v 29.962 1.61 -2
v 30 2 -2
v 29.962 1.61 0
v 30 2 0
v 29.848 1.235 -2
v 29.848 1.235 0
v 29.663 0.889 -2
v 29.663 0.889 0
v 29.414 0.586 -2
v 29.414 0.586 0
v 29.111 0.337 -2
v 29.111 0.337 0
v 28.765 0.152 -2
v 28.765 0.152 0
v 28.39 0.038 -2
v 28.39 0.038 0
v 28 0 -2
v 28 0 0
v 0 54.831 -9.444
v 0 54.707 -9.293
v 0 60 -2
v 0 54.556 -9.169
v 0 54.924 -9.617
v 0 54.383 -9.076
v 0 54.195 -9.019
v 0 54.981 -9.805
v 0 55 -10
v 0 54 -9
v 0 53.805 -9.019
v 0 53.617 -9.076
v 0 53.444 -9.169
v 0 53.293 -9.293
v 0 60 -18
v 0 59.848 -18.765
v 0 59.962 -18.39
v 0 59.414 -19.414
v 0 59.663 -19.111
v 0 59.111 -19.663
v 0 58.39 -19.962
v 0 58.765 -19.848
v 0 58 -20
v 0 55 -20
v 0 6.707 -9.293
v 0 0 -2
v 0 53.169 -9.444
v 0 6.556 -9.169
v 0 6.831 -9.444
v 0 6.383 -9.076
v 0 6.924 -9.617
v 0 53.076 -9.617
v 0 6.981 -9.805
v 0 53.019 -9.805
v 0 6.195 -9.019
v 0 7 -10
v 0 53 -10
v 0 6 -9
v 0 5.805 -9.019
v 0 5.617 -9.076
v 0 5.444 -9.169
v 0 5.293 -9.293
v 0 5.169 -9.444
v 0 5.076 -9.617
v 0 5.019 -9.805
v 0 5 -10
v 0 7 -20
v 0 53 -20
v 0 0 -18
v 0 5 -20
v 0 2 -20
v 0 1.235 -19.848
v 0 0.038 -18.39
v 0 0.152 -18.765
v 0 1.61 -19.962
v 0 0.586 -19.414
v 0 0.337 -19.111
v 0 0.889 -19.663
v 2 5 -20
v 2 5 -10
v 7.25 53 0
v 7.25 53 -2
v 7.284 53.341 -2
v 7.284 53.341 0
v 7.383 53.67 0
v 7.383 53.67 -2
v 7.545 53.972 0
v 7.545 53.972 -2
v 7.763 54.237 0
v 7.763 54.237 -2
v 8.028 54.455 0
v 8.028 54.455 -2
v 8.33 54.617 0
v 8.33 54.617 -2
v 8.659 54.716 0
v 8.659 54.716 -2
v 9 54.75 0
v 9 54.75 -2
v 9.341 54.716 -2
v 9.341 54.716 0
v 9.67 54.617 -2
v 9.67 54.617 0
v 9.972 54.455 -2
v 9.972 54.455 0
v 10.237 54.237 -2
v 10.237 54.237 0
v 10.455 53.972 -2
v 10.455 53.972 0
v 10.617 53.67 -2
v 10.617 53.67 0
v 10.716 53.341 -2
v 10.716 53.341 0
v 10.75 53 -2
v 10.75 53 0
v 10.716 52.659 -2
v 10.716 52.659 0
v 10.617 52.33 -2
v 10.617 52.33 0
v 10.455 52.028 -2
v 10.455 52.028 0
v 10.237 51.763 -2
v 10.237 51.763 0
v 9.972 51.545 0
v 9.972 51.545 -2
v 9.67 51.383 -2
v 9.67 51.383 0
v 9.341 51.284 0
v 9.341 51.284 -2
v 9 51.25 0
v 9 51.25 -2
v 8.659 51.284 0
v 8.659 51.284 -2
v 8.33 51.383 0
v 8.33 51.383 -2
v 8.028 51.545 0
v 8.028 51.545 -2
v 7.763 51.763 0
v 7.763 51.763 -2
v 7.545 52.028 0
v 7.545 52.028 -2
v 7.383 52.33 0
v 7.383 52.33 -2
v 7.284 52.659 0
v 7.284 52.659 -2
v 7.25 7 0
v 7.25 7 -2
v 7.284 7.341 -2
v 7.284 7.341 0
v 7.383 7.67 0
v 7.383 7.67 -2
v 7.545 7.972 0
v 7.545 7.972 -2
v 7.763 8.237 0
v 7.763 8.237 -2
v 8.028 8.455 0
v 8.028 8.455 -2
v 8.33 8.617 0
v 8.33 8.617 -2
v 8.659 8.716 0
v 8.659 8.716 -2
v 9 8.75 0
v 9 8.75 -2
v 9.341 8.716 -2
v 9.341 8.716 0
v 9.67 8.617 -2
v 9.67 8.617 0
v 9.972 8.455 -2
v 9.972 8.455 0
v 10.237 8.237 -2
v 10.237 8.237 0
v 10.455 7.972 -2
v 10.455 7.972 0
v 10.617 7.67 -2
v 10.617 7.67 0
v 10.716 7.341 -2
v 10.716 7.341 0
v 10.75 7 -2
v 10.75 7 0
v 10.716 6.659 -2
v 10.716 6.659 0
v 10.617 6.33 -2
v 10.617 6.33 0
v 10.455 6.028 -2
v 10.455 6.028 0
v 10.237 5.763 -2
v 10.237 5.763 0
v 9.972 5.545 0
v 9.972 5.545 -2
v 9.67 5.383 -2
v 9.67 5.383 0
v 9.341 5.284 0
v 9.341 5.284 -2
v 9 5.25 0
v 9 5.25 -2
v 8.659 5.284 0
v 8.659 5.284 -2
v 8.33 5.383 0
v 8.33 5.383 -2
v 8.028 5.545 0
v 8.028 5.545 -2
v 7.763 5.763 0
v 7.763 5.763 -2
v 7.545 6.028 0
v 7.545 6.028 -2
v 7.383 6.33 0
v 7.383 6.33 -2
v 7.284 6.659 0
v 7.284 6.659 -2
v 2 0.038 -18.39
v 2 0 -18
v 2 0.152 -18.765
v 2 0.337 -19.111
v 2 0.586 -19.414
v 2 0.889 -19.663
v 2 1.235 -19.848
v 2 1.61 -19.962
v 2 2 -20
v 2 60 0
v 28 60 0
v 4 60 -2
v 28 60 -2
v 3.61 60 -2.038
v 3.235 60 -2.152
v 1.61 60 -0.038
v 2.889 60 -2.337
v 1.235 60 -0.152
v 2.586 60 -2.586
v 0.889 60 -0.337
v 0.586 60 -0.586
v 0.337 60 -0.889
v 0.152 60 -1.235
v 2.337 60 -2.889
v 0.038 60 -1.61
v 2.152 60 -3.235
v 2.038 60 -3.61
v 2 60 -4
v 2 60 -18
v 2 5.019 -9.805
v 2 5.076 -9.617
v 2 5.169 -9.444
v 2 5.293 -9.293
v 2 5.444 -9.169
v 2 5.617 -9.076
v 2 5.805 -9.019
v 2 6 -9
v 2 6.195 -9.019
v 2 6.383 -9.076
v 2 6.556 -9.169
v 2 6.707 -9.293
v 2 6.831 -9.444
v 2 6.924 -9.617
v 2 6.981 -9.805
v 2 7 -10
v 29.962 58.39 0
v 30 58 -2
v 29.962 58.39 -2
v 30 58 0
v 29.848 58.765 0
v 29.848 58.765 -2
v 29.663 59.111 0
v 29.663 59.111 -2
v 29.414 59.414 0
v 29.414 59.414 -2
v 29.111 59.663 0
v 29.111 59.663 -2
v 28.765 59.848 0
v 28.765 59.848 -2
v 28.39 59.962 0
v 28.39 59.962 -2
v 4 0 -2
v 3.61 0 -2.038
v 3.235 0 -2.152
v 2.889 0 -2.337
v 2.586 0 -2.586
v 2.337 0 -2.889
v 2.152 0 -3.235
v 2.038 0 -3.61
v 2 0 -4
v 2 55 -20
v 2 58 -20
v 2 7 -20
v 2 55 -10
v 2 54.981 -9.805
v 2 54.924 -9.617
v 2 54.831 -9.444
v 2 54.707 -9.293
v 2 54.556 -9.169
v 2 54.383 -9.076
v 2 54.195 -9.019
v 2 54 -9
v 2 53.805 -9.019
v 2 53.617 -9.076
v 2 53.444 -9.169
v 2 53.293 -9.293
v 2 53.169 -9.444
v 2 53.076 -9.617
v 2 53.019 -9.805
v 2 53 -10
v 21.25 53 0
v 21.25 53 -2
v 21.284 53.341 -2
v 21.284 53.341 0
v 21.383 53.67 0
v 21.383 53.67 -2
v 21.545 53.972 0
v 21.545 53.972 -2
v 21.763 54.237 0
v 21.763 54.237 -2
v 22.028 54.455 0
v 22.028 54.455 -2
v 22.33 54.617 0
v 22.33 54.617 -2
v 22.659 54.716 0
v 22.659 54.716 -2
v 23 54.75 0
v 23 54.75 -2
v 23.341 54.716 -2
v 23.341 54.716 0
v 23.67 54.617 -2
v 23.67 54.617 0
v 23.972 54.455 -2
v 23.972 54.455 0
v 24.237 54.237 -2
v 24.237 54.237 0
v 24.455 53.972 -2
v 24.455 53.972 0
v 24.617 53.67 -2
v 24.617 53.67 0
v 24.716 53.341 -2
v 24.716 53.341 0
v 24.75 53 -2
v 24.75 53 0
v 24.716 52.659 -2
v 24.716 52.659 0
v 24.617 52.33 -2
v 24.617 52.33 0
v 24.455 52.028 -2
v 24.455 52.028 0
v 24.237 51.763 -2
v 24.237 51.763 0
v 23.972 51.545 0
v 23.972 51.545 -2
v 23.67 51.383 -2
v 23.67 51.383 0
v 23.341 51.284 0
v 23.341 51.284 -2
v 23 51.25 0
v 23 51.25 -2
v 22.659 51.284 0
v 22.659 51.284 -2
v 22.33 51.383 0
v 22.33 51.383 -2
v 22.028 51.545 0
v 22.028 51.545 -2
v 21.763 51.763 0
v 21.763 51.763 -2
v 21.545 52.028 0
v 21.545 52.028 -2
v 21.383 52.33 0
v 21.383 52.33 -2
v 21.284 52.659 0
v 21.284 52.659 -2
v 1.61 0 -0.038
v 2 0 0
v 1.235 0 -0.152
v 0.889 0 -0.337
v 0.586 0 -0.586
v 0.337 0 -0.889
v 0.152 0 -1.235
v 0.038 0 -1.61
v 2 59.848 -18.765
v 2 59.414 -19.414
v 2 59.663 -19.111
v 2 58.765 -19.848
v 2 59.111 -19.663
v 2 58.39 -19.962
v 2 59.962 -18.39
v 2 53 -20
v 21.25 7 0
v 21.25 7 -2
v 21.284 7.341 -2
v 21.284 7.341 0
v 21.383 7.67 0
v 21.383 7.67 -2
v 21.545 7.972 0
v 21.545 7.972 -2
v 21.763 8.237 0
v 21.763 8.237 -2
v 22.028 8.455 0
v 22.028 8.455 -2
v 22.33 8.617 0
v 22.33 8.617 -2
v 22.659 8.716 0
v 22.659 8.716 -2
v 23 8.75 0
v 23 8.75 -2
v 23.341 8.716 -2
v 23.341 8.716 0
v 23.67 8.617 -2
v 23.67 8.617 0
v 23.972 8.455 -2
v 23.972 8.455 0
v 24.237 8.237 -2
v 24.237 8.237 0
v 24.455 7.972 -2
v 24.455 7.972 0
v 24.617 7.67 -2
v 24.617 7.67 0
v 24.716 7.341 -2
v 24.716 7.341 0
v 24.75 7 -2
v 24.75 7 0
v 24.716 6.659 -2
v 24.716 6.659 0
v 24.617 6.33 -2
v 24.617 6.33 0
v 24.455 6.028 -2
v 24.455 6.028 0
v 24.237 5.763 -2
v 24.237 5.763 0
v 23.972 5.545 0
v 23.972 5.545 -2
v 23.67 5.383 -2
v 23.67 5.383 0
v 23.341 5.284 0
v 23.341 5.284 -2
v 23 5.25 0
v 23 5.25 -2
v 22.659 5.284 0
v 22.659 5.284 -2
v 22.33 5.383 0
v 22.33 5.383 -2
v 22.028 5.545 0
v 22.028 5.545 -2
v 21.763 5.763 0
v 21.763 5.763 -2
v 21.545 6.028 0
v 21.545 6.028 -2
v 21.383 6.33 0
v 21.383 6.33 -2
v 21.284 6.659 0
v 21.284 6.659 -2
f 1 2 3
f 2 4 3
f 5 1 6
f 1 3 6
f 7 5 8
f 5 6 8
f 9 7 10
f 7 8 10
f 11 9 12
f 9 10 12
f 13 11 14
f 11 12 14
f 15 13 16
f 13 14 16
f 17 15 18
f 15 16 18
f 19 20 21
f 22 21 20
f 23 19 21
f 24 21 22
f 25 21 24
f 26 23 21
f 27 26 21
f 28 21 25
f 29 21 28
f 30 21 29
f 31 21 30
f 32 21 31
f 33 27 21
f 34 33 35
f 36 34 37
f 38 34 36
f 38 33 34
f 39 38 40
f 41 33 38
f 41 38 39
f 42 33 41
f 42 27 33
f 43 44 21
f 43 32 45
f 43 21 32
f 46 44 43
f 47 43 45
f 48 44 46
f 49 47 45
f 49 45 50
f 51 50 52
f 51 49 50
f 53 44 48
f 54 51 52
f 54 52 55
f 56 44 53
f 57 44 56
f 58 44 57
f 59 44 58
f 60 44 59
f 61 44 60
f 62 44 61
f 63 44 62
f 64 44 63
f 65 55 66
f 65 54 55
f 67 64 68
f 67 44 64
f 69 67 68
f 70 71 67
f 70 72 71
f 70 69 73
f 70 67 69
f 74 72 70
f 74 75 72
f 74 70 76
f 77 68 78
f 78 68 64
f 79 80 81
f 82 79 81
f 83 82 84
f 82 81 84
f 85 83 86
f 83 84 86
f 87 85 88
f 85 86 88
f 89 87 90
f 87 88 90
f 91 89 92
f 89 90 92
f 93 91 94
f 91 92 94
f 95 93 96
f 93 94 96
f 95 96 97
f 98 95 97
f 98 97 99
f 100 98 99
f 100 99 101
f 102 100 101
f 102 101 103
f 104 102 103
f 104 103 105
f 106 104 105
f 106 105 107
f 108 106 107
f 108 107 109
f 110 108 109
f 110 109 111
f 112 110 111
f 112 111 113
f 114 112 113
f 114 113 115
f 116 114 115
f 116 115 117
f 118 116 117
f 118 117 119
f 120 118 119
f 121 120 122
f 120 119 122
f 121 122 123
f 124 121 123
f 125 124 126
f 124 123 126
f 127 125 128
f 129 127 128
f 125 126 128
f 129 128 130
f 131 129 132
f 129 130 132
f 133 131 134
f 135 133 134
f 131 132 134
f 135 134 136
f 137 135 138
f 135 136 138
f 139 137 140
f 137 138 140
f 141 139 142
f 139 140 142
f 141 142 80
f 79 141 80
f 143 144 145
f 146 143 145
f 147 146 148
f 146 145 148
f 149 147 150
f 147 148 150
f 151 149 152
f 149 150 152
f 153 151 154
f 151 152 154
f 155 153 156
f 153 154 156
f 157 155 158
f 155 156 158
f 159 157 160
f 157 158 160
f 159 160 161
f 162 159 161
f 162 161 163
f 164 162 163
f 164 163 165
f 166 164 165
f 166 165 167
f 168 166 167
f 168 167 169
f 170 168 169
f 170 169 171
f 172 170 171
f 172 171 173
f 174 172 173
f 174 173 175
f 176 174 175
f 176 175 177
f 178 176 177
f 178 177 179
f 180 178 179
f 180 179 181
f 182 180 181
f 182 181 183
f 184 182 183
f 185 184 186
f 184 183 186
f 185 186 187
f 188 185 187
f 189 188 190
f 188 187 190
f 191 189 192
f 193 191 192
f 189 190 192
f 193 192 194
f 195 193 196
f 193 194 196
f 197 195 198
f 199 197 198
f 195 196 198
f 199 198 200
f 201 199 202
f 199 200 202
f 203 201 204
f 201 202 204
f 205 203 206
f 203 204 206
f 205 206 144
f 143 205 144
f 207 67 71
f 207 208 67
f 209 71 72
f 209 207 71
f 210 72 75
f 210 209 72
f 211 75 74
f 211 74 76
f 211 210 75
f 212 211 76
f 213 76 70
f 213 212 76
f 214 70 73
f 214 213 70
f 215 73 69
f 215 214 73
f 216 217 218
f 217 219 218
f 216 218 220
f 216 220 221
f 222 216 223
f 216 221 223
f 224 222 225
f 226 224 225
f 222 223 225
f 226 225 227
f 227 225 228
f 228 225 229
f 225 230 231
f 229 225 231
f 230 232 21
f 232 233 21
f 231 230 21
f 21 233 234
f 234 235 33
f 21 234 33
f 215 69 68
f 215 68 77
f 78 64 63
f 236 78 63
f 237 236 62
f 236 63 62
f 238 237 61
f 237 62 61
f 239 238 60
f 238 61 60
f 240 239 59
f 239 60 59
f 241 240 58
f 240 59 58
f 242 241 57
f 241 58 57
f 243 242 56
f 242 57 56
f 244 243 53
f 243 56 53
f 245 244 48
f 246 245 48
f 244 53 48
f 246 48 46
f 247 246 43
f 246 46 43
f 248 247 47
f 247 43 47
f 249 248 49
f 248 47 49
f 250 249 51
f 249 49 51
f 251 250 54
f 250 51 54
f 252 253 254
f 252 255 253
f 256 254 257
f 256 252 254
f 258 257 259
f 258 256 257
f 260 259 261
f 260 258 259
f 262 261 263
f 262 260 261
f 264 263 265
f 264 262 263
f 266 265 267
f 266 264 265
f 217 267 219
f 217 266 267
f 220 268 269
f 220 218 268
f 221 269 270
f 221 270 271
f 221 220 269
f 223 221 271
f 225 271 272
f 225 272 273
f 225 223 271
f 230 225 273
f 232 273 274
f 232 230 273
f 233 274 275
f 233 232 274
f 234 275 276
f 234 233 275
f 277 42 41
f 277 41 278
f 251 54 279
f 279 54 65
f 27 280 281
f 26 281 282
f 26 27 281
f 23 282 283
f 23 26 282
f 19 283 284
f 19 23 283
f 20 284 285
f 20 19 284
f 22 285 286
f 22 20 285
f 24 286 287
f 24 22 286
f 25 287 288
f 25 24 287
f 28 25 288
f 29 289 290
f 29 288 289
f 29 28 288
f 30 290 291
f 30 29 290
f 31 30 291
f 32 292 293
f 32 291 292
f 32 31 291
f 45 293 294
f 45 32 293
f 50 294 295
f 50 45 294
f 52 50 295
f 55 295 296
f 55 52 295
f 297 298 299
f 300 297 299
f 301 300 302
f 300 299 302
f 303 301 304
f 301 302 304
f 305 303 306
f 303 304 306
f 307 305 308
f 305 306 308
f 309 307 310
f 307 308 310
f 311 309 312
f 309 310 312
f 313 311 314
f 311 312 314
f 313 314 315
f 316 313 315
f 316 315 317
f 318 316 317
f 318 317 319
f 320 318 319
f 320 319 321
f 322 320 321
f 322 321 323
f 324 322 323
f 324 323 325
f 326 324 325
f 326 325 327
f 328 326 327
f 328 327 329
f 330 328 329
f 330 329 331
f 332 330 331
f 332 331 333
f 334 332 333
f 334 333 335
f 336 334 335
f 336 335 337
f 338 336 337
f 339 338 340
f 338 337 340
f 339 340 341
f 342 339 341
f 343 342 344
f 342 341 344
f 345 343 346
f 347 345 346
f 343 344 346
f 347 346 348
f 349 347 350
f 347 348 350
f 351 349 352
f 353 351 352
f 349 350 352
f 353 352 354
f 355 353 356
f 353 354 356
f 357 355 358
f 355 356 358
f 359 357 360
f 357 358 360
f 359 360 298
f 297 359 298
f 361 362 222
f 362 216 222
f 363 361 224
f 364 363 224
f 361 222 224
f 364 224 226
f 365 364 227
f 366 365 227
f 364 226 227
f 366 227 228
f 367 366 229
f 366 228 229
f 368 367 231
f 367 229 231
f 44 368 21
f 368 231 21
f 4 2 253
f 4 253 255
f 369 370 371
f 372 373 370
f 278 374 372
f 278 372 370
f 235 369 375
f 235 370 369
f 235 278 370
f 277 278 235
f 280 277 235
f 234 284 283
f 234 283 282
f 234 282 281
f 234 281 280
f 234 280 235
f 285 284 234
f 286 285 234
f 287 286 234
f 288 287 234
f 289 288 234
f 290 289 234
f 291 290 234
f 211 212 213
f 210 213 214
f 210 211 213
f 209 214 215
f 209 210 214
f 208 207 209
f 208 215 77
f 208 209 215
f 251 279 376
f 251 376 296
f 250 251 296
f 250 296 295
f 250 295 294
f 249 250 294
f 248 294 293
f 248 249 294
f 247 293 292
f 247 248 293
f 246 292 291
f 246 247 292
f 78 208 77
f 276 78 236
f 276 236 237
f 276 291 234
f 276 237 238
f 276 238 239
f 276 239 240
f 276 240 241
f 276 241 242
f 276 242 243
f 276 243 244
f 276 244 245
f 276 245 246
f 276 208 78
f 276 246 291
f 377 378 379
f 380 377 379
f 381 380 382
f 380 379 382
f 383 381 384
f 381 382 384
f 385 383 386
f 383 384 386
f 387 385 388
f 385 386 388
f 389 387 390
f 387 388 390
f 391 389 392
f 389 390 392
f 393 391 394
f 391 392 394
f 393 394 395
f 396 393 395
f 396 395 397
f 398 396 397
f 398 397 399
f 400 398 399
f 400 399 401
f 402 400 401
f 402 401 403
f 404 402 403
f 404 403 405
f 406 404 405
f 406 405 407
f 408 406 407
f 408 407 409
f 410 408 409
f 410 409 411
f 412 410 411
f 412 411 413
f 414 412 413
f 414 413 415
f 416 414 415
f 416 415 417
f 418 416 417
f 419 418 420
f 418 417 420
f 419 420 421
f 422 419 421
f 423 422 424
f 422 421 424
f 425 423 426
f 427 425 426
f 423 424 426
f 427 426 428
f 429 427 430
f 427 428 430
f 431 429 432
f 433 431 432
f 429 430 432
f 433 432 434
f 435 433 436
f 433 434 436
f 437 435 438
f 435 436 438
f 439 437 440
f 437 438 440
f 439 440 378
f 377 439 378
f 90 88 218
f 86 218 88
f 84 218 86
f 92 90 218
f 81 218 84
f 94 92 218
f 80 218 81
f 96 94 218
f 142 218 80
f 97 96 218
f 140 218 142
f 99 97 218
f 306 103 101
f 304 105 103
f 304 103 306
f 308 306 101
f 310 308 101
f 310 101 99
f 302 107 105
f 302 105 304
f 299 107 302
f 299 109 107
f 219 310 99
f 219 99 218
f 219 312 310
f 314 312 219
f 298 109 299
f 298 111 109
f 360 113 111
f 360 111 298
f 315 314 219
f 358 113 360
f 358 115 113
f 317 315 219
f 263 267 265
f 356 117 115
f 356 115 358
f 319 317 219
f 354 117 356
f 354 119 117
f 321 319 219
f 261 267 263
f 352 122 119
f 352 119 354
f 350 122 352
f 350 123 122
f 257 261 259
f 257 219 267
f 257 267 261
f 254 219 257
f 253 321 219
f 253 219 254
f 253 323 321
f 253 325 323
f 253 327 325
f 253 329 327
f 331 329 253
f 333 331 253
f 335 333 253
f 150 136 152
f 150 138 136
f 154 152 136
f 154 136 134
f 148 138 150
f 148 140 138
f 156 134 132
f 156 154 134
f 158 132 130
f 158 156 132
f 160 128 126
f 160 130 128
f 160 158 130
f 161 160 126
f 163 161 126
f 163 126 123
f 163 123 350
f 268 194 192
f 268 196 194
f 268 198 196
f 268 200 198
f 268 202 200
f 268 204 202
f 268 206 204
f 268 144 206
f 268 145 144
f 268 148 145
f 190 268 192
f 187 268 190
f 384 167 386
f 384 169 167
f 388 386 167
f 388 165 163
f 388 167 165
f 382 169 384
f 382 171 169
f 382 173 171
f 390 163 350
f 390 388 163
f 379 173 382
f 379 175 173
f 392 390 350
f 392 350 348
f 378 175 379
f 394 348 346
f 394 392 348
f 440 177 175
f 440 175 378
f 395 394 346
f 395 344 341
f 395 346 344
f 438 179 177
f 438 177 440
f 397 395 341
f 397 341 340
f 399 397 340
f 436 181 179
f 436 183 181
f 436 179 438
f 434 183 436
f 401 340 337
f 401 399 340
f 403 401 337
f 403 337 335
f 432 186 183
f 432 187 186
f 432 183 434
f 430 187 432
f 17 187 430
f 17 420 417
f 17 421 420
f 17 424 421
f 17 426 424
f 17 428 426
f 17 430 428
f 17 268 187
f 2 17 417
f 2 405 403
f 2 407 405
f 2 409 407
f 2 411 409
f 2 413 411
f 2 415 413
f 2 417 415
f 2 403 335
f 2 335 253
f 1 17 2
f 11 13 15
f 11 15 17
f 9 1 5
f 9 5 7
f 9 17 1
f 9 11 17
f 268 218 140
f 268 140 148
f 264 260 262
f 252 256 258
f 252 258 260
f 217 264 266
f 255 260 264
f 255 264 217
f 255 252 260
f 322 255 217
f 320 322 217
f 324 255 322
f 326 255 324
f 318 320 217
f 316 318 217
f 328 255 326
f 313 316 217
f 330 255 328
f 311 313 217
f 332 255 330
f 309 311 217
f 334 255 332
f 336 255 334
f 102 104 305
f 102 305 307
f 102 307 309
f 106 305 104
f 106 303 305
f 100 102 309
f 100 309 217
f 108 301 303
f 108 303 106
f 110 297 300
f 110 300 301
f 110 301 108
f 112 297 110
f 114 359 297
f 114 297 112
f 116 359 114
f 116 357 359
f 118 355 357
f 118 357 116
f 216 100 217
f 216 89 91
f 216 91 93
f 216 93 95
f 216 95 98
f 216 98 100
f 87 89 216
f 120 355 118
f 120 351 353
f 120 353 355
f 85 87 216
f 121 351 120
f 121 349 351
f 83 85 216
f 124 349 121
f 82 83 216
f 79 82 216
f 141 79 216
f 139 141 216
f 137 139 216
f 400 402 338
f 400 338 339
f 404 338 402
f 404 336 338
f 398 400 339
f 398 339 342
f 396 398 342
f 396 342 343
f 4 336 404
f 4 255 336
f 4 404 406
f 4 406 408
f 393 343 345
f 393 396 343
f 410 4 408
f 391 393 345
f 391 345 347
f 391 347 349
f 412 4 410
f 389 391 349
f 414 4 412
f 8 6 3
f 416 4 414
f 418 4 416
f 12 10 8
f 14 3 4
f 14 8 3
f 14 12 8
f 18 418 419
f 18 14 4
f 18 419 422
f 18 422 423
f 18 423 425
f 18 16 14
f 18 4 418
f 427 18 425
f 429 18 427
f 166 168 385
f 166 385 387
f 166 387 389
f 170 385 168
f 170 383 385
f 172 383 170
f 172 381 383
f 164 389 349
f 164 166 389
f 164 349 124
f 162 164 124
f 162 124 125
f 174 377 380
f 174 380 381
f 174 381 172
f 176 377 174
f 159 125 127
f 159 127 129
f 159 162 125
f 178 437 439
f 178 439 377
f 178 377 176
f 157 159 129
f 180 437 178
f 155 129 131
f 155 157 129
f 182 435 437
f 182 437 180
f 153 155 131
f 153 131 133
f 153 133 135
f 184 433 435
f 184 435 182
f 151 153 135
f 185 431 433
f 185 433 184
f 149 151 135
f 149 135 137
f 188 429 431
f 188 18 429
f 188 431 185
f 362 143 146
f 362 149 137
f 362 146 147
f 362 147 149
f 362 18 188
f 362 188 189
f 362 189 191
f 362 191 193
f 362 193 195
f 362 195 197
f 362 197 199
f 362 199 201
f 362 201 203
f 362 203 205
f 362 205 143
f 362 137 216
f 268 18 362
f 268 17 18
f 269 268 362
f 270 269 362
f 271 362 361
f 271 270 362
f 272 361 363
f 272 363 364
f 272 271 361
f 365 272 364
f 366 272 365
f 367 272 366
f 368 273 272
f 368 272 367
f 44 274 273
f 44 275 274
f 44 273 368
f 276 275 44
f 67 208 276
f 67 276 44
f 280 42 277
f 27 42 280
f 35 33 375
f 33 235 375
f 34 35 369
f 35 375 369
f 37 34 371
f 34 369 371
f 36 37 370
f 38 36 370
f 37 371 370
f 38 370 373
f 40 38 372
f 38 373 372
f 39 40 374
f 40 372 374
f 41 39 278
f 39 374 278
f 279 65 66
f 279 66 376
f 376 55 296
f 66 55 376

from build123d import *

# Parameters (mm, degrees)
BOSS_EXTRU_1_DEPTH      = 60
ENL_V_MAT_EXTRU_1_DEPTH = 71
ESQUISSE3_R             = 1.75
ENL_V_MAT_EXTRU_2_DEPTH = 70.455021417
CONG_1_R                = 2


with BuildPart() as part:
    # Esquisse1 → Boss.-Extru.1 (new body)
    with BuildSketch(Plane(origin=(0, 0, 0), x_dir=(1, 0, 0), z_dir=(0, 1, 0))):
        Polygon((30, 0), (0, 0), (0, 20), (2, 20), (2, 2), (30, 2), align=None)
    extrude(amount=BOSS_EXTRU_1_DEPTH)

    # Esquisse2 → Enlèv. mat.-Extru.1 (cut, through all)
    with BuildSketch(Plane.ZY):
        with BuildLine():
            Line((-20, 55), (-10, 55))
            ThreePointArc((-10, 55), (-9, 54), (-10, 53))
            Line((-10, 53), (-20, 53))
            Line((-20, 53), (-20, 55))
        make_face()
        with BuildLine():
            Line((-20, 5), (-10, 5))
            ThreePointArc((-10, 5), (-9, 6), (-10, 7))
            Line((-10, 7), (-20, 7))
            Line((-20, 7), (-20, 5))
        make_face()
    extrude(amount=-ENL_V_MAT_EXTRU_1_DEPTH, mode=Mode.SUBTRACT)

    # Esquisse3 → Enlèv. mat.-Extru.2 (cut, through all)
    with BuildSketch(Plane(origin=(0, 0, -2), x_dir=(-1, 0, 0), z_dir=(0, 0, -1))):
        with Locations((-23, 53)):
            Circle(ESQUISSE3_R)
        with Locations((-9, 53)):
            Circle(ESQUISSE3_R)
        with Locations((-9, 7)):
            Circle(ESQUISSE3_R)
        with Locations((-23, 7)):
            Circle(ESQUISSE3_R)
    extrude(amount=-ENL_V_MAT_EXTRU_2_DEPTH, mode=Mode.SUBTRACT)

    # Congé1
    cong_1_edges = [part.edges().sort_by_distance(p)[0] for p in [
        (0, 30, 0),
        (2, 30, -2),
        (1, 60, -20),
        (30, 60, -1),
        (1, 0, -20),
        (30, 0, -1),
    ]]
    fillet(cong_1_edges, radius=CONG_1_R)


solid = part.part
